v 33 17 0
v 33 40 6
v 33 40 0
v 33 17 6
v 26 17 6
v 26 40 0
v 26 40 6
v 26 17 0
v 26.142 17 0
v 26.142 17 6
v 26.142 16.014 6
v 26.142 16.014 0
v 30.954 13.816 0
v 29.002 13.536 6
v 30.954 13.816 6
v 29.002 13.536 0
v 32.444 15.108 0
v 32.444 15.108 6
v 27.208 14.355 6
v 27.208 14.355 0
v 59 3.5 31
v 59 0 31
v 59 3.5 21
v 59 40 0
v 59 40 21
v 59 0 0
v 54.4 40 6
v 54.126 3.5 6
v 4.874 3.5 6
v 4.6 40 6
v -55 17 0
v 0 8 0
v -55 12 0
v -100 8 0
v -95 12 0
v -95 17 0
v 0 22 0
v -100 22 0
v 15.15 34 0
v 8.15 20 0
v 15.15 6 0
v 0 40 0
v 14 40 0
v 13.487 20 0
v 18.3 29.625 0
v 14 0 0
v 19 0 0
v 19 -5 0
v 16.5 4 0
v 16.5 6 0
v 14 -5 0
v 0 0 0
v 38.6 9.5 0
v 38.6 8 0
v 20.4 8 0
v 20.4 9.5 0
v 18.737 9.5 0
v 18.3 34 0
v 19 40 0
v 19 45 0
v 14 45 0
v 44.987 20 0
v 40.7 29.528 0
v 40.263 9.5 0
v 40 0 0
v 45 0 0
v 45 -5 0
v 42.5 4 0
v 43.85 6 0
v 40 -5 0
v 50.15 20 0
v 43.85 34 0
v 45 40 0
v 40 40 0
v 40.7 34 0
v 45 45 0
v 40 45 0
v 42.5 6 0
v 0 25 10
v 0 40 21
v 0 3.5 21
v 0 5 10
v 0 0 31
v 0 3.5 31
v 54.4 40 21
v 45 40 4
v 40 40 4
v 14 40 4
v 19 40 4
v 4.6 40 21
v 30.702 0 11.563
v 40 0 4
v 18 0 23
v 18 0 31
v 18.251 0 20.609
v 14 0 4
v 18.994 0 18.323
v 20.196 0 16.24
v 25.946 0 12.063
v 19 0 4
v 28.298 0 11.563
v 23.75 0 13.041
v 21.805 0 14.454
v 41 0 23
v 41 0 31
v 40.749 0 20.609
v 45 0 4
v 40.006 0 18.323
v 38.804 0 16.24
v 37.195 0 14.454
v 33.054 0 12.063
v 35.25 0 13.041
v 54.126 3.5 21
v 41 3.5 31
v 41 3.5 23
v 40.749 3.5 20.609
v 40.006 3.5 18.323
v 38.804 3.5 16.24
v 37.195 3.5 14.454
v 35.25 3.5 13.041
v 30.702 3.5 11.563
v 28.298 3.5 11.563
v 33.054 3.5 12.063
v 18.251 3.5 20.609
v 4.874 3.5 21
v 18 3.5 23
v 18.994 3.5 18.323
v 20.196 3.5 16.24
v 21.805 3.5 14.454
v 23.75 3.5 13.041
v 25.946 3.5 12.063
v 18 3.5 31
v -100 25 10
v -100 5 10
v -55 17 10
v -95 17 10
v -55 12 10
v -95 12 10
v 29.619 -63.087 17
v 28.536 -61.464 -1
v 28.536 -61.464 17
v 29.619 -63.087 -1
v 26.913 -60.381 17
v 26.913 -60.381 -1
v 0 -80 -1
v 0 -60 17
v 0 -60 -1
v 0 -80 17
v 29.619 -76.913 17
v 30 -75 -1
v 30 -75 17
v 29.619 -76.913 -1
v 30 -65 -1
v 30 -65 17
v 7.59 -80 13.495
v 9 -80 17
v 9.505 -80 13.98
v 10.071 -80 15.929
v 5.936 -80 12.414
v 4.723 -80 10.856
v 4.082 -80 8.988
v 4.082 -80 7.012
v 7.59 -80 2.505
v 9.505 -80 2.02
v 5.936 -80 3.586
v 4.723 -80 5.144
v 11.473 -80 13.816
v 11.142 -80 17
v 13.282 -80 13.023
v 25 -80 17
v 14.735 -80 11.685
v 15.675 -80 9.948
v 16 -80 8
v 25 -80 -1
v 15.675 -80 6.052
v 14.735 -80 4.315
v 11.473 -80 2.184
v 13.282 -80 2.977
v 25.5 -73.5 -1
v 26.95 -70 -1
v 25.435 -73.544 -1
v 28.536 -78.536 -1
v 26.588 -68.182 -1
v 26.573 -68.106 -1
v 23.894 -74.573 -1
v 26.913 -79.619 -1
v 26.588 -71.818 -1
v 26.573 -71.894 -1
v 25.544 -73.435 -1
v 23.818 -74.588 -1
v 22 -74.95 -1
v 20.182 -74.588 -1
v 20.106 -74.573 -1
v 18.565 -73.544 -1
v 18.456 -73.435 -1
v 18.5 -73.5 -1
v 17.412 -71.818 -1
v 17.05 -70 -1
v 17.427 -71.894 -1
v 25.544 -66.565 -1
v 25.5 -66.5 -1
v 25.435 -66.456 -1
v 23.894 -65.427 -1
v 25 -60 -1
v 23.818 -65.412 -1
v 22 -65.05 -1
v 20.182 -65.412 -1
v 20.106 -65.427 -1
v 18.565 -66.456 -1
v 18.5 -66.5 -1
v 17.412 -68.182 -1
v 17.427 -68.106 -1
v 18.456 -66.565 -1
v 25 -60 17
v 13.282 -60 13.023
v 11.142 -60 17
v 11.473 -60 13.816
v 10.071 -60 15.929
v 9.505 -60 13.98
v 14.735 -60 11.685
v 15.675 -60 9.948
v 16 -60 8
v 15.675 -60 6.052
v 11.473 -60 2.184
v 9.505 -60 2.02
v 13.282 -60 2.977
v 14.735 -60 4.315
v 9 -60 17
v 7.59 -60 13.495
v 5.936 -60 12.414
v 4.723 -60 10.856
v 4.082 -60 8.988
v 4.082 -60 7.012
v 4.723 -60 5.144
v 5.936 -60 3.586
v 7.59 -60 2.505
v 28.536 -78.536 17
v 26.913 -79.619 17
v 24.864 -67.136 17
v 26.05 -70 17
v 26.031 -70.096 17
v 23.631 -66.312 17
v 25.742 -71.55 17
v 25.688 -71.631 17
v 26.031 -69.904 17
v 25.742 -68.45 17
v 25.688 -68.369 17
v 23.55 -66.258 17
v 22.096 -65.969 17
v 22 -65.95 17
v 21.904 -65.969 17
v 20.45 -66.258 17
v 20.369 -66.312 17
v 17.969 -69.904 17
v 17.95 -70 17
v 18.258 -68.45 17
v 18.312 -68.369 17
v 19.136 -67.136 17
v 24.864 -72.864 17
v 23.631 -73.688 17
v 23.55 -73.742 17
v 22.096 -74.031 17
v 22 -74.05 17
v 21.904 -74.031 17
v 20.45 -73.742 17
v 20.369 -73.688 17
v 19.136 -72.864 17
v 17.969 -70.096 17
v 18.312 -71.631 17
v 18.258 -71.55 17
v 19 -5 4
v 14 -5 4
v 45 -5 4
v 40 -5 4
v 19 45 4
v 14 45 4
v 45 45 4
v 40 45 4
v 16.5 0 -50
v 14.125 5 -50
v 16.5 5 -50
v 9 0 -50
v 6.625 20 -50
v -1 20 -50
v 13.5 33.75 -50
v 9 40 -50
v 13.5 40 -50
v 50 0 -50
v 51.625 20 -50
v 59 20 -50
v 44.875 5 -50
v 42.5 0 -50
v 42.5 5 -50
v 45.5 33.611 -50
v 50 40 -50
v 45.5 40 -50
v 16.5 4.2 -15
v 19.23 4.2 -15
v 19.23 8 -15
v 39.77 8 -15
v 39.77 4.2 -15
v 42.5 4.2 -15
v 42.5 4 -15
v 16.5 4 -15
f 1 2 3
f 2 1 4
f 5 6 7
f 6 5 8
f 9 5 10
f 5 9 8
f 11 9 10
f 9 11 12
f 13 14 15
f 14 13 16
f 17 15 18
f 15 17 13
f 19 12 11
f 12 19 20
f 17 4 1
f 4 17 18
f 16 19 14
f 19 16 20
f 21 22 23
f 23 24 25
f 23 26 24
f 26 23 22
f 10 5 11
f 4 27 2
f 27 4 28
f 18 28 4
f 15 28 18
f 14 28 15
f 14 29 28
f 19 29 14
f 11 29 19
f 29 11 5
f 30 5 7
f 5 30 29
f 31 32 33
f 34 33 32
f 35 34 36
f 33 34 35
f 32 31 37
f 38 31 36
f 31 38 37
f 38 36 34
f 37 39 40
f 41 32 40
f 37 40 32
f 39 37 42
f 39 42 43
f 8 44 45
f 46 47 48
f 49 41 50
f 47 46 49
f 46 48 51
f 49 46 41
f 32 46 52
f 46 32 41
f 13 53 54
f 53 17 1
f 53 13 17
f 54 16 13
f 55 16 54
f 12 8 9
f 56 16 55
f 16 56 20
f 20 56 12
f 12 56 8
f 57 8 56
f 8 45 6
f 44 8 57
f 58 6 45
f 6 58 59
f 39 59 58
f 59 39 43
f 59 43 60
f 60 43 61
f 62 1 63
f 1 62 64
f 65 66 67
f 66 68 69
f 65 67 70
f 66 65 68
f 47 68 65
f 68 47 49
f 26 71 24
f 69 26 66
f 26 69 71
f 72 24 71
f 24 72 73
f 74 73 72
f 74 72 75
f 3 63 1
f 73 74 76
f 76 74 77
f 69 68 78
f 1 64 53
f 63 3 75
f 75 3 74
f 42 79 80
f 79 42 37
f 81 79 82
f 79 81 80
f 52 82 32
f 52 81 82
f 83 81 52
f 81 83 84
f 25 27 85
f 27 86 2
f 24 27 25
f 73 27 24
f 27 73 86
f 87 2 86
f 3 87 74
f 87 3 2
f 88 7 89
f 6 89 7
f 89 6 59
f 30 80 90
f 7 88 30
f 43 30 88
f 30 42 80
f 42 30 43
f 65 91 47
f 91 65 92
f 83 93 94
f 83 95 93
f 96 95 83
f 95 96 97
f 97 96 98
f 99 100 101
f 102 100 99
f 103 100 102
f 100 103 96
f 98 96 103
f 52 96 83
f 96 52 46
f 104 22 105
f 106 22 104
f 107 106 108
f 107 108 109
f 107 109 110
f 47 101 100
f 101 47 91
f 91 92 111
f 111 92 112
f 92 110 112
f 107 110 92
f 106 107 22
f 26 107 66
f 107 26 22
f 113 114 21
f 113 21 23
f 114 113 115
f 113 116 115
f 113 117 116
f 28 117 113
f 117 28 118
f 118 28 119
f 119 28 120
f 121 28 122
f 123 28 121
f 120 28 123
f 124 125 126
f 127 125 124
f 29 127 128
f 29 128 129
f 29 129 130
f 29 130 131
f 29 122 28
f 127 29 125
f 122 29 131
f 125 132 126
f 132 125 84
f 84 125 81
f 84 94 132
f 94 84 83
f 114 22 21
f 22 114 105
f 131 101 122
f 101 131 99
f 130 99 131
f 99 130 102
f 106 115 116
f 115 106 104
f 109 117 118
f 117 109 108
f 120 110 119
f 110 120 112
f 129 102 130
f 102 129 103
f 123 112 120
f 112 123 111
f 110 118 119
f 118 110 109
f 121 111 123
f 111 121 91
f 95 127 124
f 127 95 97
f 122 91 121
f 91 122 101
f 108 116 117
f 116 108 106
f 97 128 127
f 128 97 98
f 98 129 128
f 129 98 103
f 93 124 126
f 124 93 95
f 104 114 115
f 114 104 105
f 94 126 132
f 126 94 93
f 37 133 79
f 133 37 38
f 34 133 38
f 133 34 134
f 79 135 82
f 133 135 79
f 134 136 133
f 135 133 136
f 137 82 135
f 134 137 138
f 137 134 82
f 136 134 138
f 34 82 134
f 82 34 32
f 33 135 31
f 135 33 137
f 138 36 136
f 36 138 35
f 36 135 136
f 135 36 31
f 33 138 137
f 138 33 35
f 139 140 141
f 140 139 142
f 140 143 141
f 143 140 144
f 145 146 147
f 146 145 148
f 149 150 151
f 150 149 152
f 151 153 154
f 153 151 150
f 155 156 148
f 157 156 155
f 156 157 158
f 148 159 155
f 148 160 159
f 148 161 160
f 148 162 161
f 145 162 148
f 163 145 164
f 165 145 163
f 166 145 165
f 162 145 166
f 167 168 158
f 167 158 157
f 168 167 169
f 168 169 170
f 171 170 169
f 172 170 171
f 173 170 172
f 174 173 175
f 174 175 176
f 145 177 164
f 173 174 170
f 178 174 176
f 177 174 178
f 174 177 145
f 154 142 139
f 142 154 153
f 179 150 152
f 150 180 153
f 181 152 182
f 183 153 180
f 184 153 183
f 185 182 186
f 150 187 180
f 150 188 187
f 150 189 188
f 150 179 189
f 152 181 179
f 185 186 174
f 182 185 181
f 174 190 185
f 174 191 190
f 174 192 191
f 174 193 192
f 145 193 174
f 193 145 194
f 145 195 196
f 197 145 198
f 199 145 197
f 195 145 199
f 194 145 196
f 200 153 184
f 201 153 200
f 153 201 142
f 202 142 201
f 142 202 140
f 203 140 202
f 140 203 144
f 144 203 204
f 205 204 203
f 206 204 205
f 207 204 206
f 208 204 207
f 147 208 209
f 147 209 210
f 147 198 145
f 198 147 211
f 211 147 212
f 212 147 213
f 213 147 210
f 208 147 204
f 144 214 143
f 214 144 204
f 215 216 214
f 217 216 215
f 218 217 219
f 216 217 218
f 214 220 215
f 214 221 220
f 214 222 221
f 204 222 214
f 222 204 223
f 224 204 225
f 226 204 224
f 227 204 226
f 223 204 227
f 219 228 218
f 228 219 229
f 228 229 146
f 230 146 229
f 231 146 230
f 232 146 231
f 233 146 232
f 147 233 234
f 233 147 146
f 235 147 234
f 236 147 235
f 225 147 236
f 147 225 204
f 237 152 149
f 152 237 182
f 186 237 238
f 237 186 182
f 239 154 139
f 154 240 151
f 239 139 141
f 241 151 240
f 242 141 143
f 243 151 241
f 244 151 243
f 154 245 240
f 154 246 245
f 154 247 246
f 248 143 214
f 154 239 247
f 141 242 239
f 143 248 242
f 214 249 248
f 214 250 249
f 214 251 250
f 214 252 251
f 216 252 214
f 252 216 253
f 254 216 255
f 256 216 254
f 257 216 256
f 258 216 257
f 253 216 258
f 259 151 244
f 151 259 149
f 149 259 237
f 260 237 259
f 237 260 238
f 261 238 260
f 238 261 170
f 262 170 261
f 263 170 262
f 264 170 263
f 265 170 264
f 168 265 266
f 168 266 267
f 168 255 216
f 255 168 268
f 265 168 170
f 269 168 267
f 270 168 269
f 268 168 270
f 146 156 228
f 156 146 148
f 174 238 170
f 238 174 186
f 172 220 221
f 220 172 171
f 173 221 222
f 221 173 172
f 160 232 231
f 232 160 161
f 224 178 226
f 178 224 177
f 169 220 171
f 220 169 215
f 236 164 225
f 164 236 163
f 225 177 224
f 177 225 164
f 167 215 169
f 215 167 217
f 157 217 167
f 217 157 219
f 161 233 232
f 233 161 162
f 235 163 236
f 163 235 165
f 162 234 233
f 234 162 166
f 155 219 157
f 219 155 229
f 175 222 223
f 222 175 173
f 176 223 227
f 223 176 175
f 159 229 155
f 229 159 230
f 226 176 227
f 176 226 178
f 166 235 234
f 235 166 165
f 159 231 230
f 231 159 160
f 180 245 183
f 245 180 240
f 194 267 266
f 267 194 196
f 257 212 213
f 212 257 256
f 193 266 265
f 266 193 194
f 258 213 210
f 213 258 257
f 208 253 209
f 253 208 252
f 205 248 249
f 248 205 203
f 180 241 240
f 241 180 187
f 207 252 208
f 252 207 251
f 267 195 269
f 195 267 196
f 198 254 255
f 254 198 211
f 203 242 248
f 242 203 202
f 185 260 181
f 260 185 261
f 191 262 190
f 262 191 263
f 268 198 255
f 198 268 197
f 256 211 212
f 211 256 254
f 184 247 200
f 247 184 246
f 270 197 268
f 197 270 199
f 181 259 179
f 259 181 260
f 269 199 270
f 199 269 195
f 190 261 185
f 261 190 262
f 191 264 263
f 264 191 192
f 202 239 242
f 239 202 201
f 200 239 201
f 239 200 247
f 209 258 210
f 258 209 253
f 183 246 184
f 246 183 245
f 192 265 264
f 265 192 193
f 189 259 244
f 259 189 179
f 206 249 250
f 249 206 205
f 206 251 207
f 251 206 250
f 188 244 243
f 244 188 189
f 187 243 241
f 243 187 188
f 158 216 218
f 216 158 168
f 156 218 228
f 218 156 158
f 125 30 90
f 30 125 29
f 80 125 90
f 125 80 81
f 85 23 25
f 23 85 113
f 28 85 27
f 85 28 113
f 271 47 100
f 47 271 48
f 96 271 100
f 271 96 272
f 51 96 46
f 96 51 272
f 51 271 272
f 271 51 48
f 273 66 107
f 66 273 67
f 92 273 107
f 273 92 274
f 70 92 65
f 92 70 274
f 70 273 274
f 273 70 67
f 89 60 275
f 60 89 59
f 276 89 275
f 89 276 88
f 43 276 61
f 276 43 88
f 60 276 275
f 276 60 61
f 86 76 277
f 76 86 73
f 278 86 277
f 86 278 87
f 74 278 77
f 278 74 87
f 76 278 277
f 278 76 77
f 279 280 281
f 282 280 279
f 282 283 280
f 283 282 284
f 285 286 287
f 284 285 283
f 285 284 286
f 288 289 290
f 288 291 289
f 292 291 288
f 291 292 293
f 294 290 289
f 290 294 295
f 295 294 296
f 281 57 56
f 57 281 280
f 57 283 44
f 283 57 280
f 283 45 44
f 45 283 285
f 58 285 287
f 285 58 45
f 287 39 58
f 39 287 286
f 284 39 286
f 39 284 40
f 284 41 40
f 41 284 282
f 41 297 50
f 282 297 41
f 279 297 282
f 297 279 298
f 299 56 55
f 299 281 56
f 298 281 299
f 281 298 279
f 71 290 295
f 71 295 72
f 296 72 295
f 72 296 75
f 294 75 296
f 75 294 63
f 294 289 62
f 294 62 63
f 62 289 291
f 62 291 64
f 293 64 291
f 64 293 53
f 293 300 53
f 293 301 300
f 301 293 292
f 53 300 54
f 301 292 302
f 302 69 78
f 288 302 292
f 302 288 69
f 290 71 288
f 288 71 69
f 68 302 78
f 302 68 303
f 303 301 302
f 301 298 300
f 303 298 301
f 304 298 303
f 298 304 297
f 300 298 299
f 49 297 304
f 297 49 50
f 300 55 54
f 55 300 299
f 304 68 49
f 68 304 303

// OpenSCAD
// camera
*translate([5,5,6]) cube([49,26,35.5]);

//baseplate
difference(){
	cube([59,40,6]);
	color("green")translate([26,17,-1]){
		cube([7,26,8]);
		translate([3.5,0,0])cylinder(8,3.5,3.5);
	}
}
//front wall
difference(){
	union(){
		color("green")translate([0,0,6])cube([59,3.5,5]);
		translate([0,0,11])cube([59,3.5,20]);
	}
	color("red") translate([29.5,4,23]) rotate([90,0,0])cylinder(5,11.5,11.5);
	color("blue") translate([18,-1,23])cube([23,5,20]);
}
//left wall
color("red")translate([0,0,6]){
	linear_extrude(height=15, center=false, convexity=14, twist=0)
	polygon( [ [0,0],[0,40],[4.6,40],[4.9,0] ] );
}
//right wall
color("red")translate([59,0,6]){
	linear_extrude(height=15, center=false, convexity=14, twist=0)
	polygon( [ [0,0],[0,40],[-4.6,40],[-4.9,0] ] );
}

//elastics mounting points
translate([14,-5,])cube([5,5,4]);
translate([40,-5,])cube([5,5,4]);
translate([14,40,])cube([5,5,4]);
translate([40,40,])cube([5,5,4]);

//laser arm
paths = [[0,0],[3,10],[17,10],[20,0]];
difference(){
    color("green") translate([-50,25,10]) rotate([90,180,90]){
        linear_extrude(height = 100, center = true, convexity = 14, twist = 0) 
        polygon(paths);
    }
    color("blue") translate([-95,12,-5]) cube([40,5,17]);
    *color("purple") translate([0,3,7.5])rotate([0,-86,0]) cube([5,25,40]);
}


// laser holder
translate([0,-80,8]){
    difference(){
        linear_extrude(height = 18, center = true, convexity = 14, twist = 0)hull(){
            square([10,20]);
            translate([25,5,0]) circle(5);
            translate([25,15,0]) circle(5);
        }
        translate([10,25,0])rotate([90,0,0])cylinder(30,6,6);
        translate([22,10,-10]) cylinder(20,5,4);
        color("red")translate([3,-5,15]) rotate([0,45,0]) cube([10,30,10]);
    }
    
}




//
scale_factor = 0.7;
path_base_pillar =[[-20.5,-20],[20.5,-20],[29.5,0],[20.5,20],[-20.5,20],[-30.5,0]];
translate([29.5,20,-50])linear_extrude(height = 50, center = false, convexity = 10, scale=scale_factor)
difference(){
	color("red") polygon(path_base_pillar);
	polygon(path_base_pillar*0.75);
	color("green")translate([0,18,0])square([32,10],true);
	color("green")translate([0,-18,0])square([26,10],true);
}
translate([29.5,20,-50])color("purple")translate([-13,-16,35])cube([26,4,15]);
